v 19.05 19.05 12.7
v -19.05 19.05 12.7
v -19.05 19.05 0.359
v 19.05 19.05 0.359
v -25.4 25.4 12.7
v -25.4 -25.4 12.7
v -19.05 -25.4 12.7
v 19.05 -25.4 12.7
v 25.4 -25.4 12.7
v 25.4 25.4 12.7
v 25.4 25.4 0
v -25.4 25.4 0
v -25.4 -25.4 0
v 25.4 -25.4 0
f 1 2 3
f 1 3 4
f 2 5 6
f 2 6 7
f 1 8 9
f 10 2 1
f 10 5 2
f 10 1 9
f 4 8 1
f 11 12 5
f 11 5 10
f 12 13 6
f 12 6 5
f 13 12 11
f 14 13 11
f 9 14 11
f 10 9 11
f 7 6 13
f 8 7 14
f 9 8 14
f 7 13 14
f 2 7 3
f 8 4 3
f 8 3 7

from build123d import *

# Parameters (mm, degrees)
F0_W     = 50.8
F0_H     = 50.8
F1_DEPTH = 12.7
F2_W     = 38.1
F2_H     = 44.45
F3_DEPTH = 25.4
F5_DEPTH = 47.752


with BuildPart() as f1:
    # F0 (on Top) → F1 (new body)
    with BuildSketch(Plane.XY):
        Rectangle(F0_W, F0_H)
    extrude(amount=F1_DEPTH)

    # F2 (on face) → F3 (cut)
    with BuildSketch(Plane.XY.offset(12.7)):
        with Locations((0, -3.175)):
            Rectangle(F2_W, F2_H)
    extrude(amount=-F3_DEPTH, mode=Mode.SUBTRACT)

    # F4 (on face) → F5 (join)
    with BuildSketch(Plane.YZ.offset(25.4)):
        Polygon((20.342838, 0), (-25.4, 12.7), (-25.4, 0), align=None)
    extrude(amount=-F5_DEPTH)


solid = f1.part
